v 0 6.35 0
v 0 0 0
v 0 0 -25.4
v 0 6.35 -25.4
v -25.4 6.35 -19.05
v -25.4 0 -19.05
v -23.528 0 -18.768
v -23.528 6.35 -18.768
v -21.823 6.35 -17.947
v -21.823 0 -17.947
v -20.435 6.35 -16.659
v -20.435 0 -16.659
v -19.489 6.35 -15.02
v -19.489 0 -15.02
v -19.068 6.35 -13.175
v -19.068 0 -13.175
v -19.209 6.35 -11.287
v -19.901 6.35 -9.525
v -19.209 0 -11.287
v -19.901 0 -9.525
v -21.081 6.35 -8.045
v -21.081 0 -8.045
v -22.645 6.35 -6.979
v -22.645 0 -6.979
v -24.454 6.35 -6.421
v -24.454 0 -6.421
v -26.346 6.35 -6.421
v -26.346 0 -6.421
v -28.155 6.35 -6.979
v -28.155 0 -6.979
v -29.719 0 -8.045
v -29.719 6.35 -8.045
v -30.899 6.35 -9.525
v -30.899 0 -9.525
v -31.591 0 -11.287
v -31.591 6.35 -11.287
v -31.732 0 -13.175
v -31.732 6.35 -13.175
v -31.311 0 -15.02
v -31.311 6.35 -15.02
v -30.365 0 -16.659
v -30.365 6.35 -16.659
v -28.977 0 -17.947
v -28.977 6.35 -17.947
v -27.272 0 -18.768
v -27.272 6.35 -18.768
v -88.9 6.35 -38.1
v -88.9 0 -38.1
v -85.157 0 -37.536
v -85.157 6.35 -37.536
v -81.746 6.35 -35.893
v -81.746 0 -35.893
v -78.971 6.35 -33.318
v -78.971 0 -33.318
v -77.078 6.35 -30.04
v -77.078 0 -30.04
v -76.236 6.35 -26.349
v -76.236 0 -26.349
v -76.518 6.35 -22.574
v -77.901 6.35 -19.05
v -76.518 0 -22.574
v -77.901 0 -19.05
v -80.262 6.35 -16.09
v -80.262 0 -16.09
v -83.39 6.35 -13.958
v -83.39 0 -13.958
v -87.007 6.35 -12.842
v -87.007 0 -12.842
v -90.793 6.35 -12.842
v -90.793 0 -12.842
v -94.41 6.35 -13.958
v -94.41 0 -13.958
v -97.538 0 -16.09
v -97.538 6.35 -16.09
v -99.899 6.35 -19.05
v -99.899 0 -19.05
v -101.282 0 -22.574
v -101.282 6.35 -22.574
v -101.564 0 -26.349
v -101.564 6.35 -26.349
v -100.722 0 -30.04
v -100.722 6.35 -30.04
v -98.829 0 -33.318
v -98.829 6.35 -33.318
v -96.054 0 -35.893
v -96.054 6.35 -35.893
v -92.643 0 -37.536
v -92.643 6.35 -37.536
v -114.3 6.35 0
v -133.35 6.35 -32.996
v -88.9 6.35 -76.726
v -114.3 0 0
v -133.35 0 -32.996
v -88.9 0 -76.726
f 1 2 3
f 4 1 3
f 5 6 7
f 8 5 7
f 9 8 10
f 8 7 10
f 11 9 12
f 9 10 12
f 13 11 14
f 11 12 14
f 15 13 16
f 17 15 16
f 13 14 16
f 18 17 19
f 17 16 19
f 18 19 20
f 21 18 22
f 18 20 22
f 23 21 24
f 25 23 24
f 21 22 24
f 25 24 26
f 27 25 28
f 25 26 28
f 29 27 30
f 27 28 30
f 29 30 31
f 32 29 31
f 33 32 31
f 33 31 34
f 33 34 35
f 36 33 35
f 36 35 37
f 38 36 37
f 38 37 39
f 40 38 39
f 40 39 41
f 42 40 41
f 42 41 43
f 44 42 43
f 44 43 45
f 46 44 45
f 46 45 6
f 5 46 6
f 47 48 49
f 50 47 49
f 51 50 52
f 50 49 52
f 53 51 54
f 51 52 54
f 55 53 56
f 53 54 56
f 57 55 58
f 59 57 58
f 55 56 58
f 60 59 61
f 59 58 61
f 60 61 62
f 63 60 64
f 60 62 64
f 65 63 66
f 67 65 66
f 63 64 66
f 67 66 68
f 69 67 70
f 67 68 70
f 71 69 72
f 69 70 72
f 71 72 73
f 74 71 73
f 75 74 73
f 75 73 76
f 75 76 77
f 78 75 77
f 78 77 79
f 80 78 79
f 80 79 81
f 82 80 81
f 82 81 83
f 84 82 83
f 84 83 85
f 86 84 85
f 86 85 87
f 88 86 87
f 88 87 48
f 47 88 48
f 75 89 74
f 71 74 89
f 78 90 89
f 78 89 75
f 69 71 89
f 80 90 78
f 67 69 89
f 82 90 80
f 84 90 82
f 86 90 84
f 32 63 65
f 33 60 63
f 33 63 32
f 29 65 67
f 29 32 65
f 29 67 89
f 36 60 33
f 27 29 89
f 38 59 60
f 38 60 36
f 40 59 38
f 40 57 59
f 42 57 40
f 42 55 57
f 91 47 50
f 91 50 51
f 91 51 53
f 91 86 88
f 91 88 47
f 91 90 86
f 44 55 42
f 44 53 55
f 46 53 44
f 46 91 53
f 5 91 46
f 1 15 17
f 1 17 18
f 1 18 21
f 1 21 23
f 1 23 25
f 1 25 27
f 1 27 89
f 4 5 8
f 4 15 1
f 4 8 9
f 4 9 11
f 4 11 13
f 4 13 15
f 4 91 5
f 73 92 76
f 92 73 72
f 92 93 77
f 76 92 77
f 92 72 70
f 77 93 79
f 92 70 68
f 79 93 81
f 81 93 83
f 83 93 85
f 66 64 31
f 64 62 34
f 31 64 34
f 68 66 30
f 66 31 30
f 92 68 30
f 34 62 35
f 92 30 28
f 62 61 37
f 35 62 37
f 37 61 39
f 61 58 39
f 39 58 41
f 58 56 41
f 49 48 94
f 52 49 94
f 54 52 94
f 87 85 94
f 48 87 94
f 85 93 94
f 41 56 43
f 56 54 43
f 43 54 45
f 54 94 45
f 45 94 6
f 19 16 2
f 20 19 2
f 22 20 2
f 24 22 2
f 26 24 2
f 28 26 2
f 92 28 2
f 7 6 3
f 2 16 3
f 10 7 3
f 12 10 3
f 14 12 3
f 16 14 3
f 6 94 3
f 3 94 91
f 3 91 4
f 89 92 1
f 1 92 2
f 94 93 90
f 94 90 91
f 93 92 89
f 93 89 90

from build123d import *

# Parameters (mm, degrees)
SKETCH1_W           = 114.3
SKETCH1_H           = 25.4
BOSS_EXTRUDE1_DEPTH = 6.35
CUT_EXTRUDE1_REACH  = 155.979
SKETCH2_R           = 12.7
SKETCH2_R_2         = 6.35


with BuildPart() as part:
    # Sketch1 → Boss-Extrude1 (new body)
    with BuildSketch(Plane(origin=(0, 0, 0), x_dir=(1, 0, 0), z_dir=(0, 1, 0))):
        with Locations((-57.15, 12.7)):
            Rectangle(SKETCH1_W, SKETCH1_H)
        Polygon((-88.9, 76.726438931), (0, 25.4), (-114.3, 25.4), (-114.3, 0), (-133.35, 32.995567884), align=None)
    extrude(amount=BOSS_EXTRUDE1_DEPTH)

    # Sketch2 → Cut-Extrude1 (cut, up to next)
    with BuildSketch(Plane.XZ, mode=Mode.PRIVATE) as cut_extrude1_sk1:
        with Locations(Location((-88.9, -25.4, 0), (0, 0, 270))):
            Circle(SKETCH2_R)
    cut_extrude1_tool1 = extrude(cut_extrude1_sk1.sketch, amount=-CUT_EXTRUDE1_REACH, mode=Mode.PRIVATE) & part.part
    # Sketch2 → Cut-Extrude1 (cut, up to next)
    with BuildSketch(Plane.XZ, mode=Mode.PRIVATE) as cut_extrude1_sk2:
        with Locations(Location((-25.4, -12.7, 0), (0, 0, 270))):
            Circle(SKETCH2_R_2)
    cut_extrude1_tool2 = extrude(cut_extrude1_sk2.sketch, amount=-CUT_EXTRUDE1_REACH, mode=Mode.PRIVATE) & part.part
    add(cut_extrude1_tool1.solids().sort_by_distance((-88.9, 0, -25.4))[0], mode=Mode.SUBTRACT)
    add(cut_extrude1_tool2.solids().sort_by_distance((-25.4, 0, -12.7))[0], mode=Mode.SUBTRACT)


solid = part.part
